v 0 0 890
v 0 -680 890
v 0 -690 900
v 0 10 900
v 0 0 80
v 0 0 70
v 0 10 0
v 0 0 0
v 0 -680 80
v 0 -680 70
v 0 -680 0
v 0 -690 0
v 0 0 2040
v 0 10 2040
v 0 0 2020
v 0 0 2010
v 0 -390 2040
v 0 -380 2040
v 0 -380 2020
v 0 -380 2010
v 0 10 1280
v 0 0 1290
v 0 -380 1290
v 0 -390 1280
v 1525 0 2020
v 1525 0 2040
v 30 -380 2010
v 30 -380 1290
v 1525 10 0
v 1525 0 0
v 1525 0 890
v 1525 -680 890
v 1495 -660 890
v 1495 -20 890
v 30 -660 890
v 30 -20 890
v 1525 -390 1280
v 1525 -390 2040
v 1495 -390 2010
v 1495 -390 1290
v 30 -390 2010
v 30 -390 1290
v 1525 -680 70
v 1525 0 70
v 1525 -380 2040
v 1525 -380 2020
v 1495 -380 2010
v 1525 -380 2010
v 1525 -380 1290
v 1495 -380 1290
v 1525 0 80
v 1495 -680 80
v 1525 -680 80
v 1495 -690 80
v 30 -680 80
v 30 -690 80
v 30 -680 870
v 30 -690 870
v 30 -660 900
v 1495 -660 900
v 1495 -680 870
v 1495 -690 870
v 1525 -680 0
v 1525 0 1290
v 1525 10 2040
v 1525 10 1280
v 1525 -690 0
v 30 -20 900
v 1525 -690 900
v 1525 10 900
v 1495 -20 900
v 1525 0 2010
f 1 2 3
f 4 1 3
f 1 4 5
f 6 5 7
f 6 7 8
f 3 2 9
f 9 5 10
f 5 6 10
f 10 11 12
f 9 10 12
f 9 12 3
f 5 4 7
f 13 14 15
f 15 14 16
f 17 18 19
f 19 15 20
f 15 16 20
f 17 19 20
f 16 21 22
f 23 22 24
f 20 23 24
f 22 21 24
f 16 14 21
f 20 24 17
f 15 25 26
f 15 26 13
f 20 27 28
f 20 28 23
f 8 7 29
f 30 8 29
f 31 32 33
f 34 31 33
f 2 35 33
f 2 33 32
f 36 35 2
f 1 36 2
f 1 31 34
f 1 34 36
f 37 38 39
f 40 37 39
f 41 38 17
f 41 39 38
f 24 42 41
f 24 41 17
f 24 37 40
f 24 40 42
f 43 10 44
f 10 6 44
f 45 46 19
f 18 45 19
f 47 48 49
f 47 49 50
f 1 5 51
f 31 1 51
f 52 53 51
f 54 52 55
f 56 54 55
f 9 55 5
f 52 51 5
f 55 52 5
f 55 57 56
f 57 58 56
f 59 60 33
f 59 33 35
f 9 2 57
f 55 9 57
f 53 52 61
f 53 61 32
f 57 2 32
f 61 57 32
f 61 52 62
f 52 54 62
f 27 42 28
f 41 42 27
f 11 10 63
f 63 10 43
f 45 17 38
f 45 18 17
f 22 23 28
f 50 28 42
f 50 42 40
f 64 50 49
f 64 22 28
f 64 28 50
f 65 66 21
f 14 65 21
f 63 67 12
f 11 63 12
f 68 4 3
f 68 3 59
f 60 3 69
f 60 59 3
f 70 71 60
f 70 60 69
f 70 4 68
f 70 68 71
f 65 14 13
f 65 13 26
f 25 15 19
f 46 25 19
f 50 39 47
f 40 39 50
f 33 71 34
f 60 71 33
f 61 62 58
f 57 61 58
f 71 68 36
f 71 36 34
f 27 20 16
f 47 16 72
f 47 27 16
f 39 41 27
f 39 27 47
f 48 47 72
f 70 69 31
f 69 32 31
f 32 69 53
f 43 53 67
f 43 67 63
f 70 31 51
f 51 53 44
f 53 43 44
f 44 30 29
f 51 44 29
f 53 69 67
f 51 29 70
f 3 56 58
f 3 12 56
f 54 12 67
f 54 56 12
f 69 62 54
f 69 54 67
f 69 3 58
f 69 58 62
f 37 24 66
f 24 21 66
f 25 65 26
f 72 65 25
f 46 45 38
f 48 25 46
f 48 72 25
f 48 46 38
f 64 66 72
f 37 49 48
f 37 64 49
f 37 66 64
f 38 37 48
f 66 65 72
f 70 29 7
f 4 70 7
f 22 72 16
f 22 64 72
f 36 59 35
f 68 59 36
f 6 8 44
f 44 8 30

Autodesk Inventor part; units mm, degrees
ref_plane "YZ Plane" through (0, 0, 0) normal (1, 0, 0) x (0, 1, 0)
ref_plane "XZ Plane" through (0, 0, 0) normal (0, 1, 0) x (-1, 0, 0)
sketch "Sketch1" plane through (0, 0, 0) normal (0, 0, 1) x (1, 0, 0)
  line L0 (0, 0) -> (1525, 0)
  line L1 (1525, 0) -> (1525, 10)
  line L2 (1525, 10) -> (0, 10)
  line L3 (0, 10) -> (0, 0)
  dimension "ancho" = 1525
  dimension "espesor" = 10
extrude "Extrusion1" add sketch "Sketch1" along normal blind 900
sketch "Sketch2" plane through (0, 0, 0) normal (0, -1, 0) x (1, 0, 0)
  line L0 (0, 0) -> (1525, 0) construction
  line L1 (1525, 0) -> (1525, 900) construction
  line L2 (0, 900) -> (1525, 900) construction
  line L3 (0, 0) -> (0, 900) construction
  line L4 (0, 0) -> (0, 900) projected
  line L5 (0, 70) -> (1525, 70)
  line L6 (1525, 70) -> (1525, 80)
  line L7 (1525, 80) -> (0, 80)
  line L8 (0, 80) -> (0, 70)
  line L9 (0, 900) -> (1525, 900) projected
  line L10 (1525, 0) -> (1525, 900) projected
  line L11 (0, 900) -> (1525, 900)
  line L12 (1525, 900) -> (1525, 890)
  line L13 (1525, 890) -> (0, 890)
  line L14 (0, 890) -> (0, 900)
  dimension "d5" = 10
  dimension "d6" = 10
  dimension "d7" = 80
extrude "Extrusion2" add sketch "Sketch2" along normal blind 690 contours L4 L7 L6 L5 | L4 L9 L10 L13
sketch "Sketch3" plane through (0, 0, 900) normal (0, 0, 1) x (1, 0, 0)
  line L0 (1525, 10) -> (1525, -690) projected
  line L1 (1525, 10) -> (0, 10) projected
  line L2 (0, 10) -> (0, -690) projected
  line L3 (1525, -690) -> (0, -690) projected
  line L4 (30, -660) -> (30, -20)
  line L5 (30, -20) -> (1495, -20)
  line L6 (1495, -20) -> (1495, -660)
  line L7 (1495, -660) -> (30, -660)
  point P0 (0, 0)
  dimension "d10" = 30
extrude "Extrusion3" cut sketch "Sketch3" against normal up to next contours L4 L5 L6 L7
sketch "Sketch4" plane through (0, -690, 0) normal (0, -1, 0) x (1, 0, 0)
  line L0 (0, 70) -> (1525, 70) construction
  line L1 (1525, 70) -> (1525, 80) construction
  line L2 (1525, 80) -> (0, 80) construction
  line L3 (0, 80) -> (0, 70) construction
  line L4 (0, 900) -> (0, 890) construction
  line L5 (0, 890) -> (1525, 890) construction
  line L6 (1525, 890) -> (1525, 900) construction
  line L7 (1525, 900) -> (0, 900) construction
  line L8 (1525, 70) -> (0, 70) construction
  line L9 (0, 0) -> (0, 70) construction
  line L10 (0, 0) -> (1525, 0) construction
  line L11 (1525, 0) -> (1525, 70) construction
  line L12 (0, 900) -> (1525, 900)
  line L13 (1525, 900) -> (1525, 0)
  line L14 (1525, 0) -> (0, 0)
  line L15 (0, 0) -> (0, 900)
  line L16 (1525, 80) -> (0, 80) projected
  line L17 (30, 80) -> (1495, 80)
  line L18 (1495, 80) -> (1495, 890)
  line L19 (1495, 890) -> (30, 890)
  line L20 (30, 890) -> (30, 80)
  dimension "d13" = 30
  dimension "d14" = 30
extrude "Extrusion4" add sketch "Sketch4" against normal blind 10 contours L12 L13 L16 L18 L19 L20 L15 | L16 L13 L14 L15
ref_plane "Work Plane1" through (0, 0, 1280) normal (0, 0, 1) x (1, 0, 0)
sketch "Sketch5" plane through (0, 0, 1280) normal (0, 0, 1) x (1, 0, 0)
  line L0 (1525, 10) -> (0, 10) projected
  line L1 (0, 10) -> (0, -690) projected
  line L2 (1525, 10) -> (1525, -690) projected
  line L3 (1525, -690) -> (0, -690) projected
  line L4 (0, 10) -> (1525, 10)
  line L5 (1525, 10) -> (1525, -390)
  line L6 (1525, -390) -> (0, -390)
  line L7 (0, -390) -> (0, 10)
  line L8 (1495, -660) -> (1495, -20) projected
  line L9 (0, -390) -> (1495, -390)
  line L10 (1495, -390) -> (1495, -380)
  line L11 (1495, -380) -> (0, -380)
  line L12 (0, -380) -> (0, -390)
  point P0 (0, 0)
  dimension "d36" = 1525
  dimension "profundidad2" = 400
  dimension "d39" = 10
extrude "Extrusion5" add sketch "Sketch5" along normal blind 10 contours L2 L6 L8 L11 L1 L0 | L11 L8 L6 L1
sketch "Sketch9" plane through (0, -690, 0) normal (0, -1, 0) x (1, 0, 0)
  line L0 (30, 890) -> (1495, 890) construction
  line L1 (1495, 80) -> (30, 80) construction
  line L2 (0, 900) -> (0, 0) construction
  line L3 (1525, 0) -> (0, 0) construction
  line L4 (1525, 900) -> (1525, 0) construction
  line L5 (1525, 900) -> (0, 900) construction
  line L6 (1525, 70) -> (1525, 0) projected
  line L7 (0, 900) -> (1525, 900)
  line L8 (1525, 900) -> (1525, 870)
  line L9 (1525, 870) -> (0, 870)
  line L10 (0, 870) -> (0, 900)
  line L11 (1495, 890) -> (1495, 80) projected
  line L12 (30, 80) -> (30, 890) projected
  point P0 (1525, 890)
  point P1 (1525, 80)
  dimension "d32" = 30
extrude "Extrusion9" add sketch "Sketch9" against normal blind 10
sketch "Boceto10" plane through (0, 0, 1290) normal (0, 0, 1) x (1, 0, 0)
  line L0 (0, 10) -> (0, -390) projected
  line L1 (0, -390) -> (1525, -390) projected
  line L2 (1525, -390) -> (1525, 10) projected
  line L3 (1525, 10) -> (0, 10) projected
  line L4 (1525, 10) -> (1525, -690) projected
  line L5 (0, -390) -> (1525, -390)
  line L6 (1525, -390) -> (1525, -380)
  line L7 (1525, -380) -> (0, -380)
  line L8 (0, -380) -> (0, -390)
  line L9 (0, 10) -> (1525, 10)
  line L10 (1525, 10) -> (1525, 0)
  line L11 (1525, 0) -> (0, 0)
  line L12 (0, 0) -> (0, 10)
  point P0 (0, 0)
  dimension "d40" = 10
  dimension "d41" = 10
extrude "Extrusión10" add sketch "Boceto10" along normal blind 750 contours L3 L2 L11 L0 | L7 L2 L1 L0
sketch "Boceto11" plane through (0, -390, 1280) normal (0, -1, 0) x (1, 0, 0)
  line L0 (0, 760) -> (1525, 760) projected
  line L1 (1525, 0) -> (1525, 760) projected
  line L2 (0, 760) -> (1525, 760) projected
  line L3 (0, 0) -> (0, 760) projected
  line L4 (30, 730) -> (1495, 730)
  line L5 (1495, 730) -> (1495, 10)
  line L6 (1495, 10) -> (30, 10)
  line L7 (30, 10) -> (30, 730)
  line L8 (0, 0) -> (1525, 0) projected
  point P0 (0, -1280)
  dimension "d44" = 30
  dimension "d45" = 30
  dimension "d46" = 30
extrude "Extrusión11" cut sketch "Boceto11" against normal up to next contours L4 L5 L6 L7
sketch "Sketch13" plane through (1525, -390, 1280) normal (1, 0, 0) x (0, 0, -1)
  line L0 (0, 0) -> (0, 400) construction
  line L1 (0, 400) -> (-760, 400) construction
  line L2 (-10, 390) -> (-760, 390) construction
  line L3 (-10, 10) -> (-760, 10) construction
  line L4 (-760, 0) -> (-760, 10) construction
  line L5 (0, 0) -> (-760, 0) construction
  line L6 (1280, 400) -> (-760, 400) projected
  line L7 (-740, 0) -> (-730, 0)
  line L8 (-730, 0) -> (-730, 400)
  line L9 (-730, 400) -> (-740, 400)
  line L10 (-740, 400) -> (-740, 0)
  line L11 (-760, 390) -> (-760, 400) projected
  line L12 (-10, 10) -> (-10, 390) projected
  point P0 (1280, 390)
  point P1 (1030, 400)
  dimension "d53" = 10
  dimension "d54" = 20
extrude "Extrusion13" add sketch "Sketch13" against normal blind 1525
equation "\"d5\" = espesor"
equation "\"d6\" = espesor"
equation "\"d10\" = 3 * espesor"
equation "\"d13\" = 3 * espesor"
equation "\"d14\" = 3 * espesor"
equation "\"d15\" = espesor"
equation "\"d36\" = ancho"
equation "\"d39\" = espesor"
equation "\"d18\" = espesor"
equation "\"d32\" = 3 * espesor"
equation "\"d33\" = espesor"
equation "\"d40\" = espesor"
equation "\"d41\" = espesor"
equation "\"d44\" = 3 * espesor"
equation "\"d45\" = 3 * espesor"
equation "\"d46\" = 3 * espesor"
equation "\"d53\" = espesor"
equation "\"d54\" = 2 * espesor"
equation "\"d55\" = ancho"
properties part number "esqueleto_mueble"
